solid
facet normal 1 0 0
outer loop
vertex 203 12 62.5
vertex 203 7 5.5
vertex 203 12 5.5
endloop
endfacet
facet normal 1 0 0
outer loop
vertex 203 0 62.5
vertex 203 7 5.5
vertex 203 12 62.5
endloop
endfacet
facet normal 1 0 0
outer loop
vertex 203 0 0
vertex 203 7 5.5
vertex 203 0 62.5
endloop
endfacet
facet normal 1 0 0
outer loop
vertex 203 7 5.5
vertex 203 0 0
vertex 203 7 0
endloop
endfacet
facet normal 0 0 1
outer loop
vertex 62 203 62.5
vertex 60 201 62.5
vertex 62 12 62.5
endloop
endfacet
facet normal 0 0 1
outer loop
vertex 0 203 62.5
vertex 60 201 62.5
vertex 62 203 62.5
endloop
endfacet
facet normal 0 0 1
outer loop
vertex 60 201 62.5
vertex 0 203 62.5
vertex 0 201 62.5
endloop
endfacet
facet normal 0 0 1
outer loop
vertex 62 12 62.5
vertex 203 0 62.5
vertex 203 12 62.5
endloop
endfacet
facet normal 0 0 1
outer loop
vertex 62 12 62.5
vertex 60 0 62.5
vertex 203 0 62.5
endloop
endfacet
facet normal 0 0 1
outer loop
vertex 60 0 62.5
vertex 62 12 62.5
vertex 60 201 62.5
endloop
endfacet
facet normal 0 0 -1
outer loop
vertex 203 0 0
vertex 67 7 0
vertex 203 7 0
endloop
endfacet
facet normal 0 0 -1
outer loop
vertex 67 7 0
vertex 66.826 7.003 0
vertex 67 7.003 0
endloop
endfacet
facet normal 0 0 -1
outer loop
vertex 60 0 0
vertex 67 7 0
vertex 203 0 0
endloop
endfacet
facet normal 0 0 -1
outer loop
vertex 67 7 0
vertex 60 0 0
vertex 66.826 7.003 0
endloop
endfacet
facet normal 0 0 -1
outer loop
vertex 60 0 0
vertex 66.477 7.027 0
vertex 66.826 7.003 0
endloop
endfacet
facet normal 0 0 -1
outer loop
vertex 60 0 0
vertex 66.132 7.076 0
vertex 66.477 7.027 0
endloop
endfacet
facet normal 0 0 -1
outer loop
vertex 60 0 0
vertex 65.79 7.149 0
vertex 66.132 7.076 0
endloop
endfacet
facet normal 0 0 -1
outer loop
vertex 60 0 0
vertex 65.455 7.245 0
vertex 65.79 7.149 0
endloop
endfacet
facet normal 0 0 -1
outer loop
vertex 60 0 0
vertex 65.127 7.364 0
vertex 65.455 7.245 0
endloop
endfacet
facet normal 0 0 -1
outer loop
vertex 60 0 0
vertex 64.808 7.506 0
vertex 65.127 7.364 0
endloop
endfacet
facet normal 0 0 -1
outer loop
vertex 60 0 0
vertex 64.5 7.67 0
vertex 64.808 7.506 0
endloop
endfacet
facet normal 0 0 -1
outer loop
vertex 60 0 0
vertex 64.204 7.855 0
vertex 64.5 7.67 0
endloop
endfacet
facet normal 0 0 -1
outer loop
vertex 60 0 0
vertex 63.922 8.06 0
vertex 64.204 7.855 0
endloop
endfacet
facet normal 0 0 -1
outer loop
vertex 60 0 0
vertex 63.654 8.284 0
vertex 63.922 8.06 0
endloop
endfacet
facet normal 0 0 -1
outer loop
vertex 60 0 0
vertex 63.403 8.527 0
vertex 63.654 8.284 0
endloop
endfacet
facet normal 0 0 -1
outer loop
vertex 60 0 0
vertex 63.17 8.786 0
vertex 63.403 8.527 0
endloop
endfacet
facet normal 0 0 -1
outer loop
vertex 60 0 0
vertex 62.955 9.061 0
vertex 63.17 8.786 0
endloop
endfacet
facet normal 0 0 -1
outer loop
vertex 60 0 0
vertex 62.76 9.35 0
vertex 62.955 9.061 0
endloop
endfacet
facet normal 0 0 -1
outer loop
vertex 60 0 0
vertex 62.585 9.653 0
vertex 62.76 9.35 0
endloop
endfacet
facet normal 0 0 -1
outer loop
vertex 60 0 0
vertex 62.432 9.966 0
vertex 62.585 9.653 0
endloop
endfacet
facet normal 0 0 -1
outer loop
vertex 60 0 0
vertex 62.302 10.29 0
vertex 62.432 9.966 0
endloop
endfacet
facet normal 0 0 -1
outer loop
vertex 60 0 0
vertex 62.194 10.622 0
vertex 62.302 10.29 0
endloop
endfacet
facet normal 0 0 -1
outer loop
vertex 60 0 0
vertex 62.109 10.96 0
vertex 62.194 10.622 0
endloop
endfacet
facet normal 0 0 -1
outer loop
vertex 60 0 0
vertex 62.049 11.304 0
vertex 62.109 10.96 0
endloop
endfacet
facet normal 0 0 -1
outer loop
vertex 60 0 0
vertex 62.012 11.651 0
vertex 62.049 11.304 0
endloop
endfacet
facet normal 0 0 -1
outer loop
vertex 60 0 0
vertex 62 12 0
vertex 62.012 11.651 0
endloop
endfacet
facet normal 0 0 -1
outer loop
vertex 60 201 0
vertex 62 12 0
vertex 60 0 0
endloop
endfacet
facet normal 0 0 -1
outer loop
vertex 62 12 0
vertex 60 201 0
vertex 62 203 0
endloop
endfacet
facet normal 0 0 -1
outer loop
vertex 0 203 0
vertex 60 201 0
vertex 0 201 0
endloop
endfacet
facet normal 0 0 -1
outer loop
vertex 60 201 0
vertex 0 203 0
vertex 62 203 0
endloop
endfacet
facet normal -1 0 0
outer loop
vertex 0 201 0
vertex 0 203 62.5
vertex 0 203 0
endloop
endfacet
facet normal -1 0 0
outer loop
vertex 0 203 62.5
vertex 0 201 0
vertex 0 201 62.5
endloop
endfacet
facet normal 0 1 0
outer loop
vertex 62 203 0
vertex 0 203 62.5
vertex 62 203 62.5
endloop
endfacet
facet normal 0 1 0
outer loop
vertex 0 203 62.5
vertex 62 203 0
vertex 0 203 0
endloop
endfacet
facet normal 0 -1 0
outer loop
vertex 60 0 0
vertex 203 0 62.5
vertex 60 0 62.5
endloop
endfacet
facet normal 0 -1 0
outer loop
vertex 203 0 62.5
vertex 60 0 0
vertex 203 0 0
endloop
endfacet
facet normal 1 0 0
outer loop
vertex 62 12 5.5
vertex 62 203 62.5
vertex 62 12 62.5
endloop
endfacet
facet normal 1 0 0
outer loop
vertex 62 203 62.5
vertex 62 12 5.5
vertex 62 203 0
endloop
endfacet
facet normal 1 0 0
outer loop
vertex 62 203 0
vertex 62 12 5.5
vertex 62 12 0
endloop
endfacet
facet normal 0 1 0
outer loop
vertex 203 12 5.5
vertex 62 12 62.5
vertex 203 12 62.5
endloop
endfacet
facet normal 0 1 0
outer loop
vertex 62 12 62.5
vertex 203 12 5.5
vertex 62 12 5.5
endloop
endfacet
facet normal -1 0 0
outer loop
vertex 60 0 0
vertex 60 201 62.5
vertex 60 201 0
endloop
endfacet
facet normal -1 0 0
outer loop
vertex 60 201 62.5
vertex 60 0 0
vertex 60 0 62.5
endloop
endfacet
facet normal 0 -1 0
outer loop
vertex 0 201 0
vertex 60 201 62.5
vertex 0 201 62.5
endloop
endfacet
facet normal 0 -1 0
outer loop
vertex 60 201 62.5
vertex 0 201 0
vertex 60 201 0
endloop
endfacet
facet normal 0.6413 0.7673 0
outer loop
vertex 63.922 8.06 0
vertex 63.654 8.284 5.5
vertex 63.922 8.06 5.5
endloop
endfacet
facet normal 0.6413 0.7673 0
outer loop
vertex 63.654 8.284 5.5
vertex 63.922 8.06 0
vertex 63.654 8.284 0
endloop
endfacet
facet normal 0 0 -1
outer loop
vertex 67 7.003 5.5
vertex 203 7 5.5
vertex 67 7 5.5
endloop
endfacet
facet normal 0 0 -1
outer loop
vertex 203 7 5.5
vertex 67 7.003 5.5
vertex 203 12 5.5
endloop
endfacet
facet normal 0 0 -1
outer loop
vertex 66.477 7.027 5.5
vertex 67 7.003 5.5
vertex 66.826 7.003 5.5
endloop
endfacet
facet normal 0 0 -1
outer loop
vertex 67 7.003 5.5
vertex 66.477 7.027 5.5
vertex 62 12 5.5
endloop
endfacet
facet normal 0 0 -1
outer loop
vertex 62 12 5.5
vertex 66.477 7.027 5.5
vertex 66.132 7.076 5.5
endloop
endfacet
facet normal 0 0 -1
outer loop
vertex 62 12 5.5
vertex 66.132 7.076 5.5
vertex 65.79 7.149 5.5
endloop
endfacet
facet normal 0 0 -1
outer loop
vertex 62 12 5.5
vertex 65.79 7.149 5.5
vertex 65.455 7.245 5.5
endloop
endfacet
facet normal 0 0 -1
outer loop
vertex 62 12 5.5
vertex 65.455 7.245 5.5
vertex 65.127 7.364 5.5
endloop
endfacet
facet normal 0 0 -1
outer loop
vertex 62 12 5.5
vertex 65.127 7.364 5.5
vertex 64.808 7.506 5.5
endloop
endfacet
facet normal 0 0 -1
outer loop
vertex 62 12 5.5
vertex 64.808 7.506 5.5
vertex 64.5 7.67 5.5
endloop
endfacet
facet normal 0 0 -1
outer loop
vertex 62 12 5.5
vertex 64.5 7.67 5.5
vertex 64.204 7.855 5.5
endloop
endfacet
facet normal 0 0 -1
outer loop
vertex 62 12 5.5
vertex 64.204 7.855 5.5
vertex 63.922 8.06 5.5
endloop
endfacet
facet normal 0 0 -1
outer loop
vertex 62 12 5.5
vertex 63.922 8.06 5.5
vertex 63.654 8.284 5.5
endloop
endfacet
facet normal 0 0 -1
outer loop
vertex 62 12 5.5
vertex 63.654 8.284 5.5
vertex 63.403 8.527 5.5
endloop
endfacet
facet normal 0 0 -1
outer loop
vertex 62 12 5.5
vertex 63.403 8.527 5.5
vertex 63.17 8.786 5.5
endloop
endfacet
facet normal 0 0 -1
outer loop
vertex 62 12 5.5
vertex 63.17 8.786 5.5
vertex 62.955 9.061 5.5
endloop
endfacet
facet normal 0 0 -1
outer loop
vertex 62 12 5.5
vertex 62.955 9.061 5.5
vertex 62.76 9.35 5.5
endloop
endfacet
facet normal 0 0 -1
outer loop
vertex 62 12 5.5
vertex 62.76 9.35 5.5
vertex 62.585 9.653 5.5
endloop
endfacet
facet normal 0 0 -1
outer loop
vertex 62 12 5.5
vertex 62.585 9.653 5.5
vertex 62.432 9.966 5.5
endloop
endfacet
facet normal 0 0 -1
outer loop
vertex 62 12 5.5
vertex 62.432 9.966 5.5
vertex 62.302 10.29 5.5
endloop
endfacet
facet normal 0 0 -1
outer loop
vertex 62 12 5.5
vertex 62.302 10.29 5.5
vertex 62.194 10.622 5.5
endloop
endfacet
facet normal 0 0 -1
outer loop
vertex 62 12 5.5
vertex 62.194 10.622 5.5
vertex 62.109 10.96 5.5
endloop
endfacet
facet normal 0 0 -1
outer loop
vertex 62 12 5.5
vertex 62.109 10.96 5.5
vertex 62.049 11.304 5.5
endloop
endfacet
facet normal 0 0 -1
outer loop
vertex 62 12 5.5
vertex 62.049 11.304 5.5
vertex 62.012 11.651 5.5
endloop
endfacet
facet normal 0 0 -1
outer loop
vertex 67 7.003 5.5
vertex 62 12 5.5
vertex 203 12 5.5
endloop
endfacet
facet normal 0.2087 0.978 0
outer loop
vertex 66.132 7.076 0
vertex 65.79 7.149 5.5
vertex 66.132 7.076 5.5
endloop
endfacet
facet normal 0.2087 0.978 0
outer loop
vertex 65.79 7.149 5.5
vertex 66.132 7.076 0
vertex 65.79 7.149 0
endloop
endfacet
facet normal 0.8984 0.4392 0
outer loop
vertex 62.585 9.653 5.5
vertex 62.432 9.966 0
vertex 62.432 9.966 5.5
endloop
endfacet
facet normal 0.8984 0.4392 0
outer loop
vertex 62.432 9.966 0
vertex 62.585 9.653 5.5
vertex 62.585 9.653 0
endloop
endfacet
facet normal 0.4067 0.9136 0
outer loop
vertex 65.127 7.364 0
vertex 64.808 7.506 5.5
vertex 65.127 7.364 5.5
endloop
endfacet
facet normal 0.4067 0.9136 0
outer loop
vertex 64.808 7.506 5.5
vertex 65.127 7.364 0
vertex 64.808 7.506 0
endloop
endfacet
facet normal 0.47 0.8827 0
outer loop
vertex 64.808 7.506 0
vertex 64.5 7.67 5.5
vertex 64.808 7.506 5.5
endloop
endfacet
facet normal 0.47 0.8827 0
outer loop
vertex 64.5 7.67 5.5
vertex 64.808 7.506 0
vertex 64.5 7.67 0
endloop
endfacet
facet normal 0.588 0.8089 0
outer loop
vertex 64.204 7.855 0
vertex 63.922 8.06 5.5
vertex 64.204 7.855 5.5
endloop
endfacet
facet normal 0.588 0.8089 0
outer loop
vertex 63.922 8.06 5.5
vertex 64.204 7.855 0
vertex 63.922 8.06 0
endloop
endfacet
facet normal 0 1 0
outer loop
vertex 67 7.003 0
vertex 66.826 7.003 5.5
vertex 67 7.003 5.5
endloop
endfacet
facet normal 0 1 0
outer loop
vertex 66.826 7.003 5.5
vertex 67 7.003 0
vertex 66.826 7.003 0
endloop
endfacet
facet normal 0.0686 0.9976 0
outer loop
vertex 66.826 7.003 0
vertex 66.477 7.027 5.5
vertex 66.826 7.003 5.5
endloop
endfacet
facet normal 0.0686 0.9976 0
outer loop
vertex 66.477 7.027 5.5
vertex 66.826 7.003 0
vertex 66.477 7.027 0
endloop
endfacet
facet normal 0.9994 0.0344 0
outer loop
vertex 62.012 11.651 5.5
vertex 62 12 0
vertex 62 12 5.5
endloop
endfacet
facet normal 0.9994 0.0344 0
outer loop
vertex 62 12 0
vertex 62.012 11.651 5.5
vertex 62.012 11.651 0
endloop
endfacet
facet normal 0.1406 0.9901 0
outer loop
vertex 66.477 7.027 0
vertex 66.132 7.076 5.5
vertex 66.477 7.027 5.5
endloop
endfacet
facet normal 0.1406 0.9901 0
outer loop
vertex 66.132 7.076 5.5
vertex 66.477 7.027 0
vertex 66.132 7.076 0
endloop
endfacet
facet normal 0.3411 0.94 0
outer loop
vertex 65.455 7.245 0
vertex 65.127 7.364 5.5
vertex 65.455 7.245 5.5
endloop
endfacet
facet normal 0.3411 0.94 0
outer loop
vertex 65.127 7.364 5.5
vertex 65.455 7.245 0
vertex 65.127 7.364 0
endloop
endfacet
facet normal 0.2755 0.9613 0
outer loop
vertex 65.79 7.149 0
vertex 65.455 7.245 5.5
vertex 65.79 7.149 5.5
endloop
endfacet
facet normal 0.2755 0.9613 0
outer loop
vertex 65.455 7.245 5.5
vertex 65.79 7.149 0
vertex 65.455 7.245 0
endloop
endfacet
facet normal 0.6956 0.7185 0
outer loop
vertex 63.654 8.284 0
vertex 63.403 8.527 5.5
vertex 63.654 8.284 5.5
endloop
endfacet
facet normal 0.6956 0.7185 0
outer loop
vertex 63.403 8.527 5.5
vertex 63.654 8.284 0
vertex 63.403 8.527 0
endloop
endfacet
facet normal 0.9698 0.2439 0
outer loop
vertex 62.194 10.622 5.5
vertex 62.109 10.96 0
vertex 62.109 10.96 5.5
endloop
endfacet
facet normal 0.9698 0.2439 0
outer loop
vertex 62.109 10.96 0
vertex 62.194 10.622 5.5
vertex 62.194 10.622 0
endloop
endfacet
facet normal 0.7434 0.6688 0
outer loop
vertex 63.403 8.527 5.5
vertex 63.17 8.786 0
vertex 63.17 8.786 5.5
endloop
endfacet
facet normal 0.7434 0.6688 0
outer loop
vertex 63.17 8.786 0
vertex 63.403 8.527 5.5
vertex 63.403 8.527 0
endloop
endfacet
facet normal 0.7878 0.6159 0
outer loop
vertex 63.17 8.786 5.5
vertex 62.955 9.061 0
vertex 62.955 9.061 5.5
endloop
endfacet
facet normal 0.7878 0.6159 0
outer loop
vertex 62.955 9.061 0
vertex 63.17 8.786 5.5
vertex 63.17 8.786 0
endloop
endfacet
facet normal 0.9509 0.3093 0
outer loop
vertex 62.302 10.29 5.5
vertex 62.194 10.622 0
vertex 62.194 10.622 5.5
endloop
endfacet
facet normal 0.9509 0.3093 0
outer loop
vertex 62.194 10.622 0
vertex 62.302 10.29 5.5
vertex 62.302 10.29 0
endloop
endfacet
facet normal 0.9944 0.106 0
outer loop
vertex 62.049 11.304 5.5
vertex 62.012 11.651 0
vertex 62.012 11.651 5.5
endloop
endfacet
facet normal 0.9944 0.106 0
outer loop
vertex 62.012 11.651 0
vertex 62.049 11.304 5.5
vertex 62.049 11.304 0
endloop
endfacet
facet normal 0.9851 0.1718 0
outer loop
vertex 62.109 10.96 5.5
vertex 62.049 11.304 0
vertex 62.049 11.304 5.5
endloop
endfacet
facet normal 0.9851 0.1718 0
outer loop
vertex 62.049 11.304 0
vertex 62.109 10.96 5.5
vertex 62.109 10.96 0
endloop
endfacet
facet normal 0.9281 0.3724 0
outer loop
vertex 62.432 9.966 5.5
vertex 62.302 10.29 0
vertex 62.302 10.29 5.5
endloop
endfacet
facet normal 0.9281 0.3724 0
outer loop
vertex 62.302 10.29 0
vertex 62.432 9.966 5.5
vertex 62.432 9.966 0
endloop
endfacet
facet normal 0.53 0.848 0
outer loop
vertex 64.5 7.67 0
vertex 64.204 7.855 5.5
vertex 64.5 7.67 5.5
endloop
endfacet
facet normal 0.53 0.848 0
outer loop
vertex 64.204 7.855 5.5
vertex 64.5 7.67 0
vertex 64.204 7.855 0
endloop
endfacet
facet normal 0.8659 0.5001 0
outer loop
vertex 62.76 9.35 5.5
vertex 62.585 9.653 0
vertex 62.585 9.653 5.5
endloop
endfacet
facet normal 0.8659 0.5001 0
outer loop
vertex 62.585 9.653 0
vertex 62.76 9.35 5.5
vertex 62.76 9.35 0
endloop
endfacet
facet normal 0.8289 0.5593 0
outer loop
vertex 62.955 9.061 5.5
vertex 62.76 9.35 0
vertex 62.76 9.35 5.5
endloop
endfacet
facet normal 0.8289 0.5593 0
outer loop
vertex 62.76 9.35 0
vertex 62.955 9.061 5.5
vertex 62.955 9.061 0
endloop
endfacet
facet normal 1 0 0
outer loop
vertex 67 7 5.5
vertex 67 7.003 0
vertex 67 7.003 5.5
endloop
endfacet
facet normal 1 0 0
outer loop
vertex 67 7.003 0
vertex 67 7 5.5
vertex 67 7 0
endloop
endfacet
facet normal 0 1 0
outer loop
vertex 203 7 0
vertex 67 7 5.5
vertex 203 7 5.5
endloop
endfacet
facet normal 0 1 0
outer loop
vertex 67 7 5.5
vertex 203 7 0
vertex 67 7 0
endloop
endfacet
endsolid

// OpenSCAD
// file: _common.scad
$fa=4; // default minimum facet angle is now 0.5
$fs=0.05; // defaul

wallThickness = 2;
caseWidth = 120;
caseHeight = 50;
caseDepth = 75;

ledStripWidth = 11;

sideLen = 203;

dioramaWidth = caseWidth + 1 + wallThickness * 2;

bottomHeight = caseHeight + 10;

backDepth = 10;

acrylicThickness = 2.25;
woodThickness = 5.2;
// main file
include <_common.scad>

difference() {
  cube([sideLen, sideLen, dioramaWidth / 2]);
  translate([bottomHeight + wallThickness, backDepth + wallThickness, -.1]) cube([sideLen - bottomHeight + .1, sideLen - backDepth + .1, dioramaWidth / 2 + .2]);
  translate([-.1, -.1, -.1]) cube([bottomHeight + .1, sideLen - wallThickness + .1, dioramaWidth / 2 + .2]);
  translate([bottomHeight + wallThickness + backDepth / 2, backDepth + wallThickness, -.1]) cylinder(r = backDepth / 2, h = ledStripWidth / 2 + .1);
  translate([bottomHeight + wallThickness + backDepth / 2, backDepth / 2 + wallThickness, -.1]) cube([sideLen - bottomHeight - wallThickness - backDepth / 2 + .1, backDepth / 2 + .1, ledStripWidth / 2 + .1]);
}
